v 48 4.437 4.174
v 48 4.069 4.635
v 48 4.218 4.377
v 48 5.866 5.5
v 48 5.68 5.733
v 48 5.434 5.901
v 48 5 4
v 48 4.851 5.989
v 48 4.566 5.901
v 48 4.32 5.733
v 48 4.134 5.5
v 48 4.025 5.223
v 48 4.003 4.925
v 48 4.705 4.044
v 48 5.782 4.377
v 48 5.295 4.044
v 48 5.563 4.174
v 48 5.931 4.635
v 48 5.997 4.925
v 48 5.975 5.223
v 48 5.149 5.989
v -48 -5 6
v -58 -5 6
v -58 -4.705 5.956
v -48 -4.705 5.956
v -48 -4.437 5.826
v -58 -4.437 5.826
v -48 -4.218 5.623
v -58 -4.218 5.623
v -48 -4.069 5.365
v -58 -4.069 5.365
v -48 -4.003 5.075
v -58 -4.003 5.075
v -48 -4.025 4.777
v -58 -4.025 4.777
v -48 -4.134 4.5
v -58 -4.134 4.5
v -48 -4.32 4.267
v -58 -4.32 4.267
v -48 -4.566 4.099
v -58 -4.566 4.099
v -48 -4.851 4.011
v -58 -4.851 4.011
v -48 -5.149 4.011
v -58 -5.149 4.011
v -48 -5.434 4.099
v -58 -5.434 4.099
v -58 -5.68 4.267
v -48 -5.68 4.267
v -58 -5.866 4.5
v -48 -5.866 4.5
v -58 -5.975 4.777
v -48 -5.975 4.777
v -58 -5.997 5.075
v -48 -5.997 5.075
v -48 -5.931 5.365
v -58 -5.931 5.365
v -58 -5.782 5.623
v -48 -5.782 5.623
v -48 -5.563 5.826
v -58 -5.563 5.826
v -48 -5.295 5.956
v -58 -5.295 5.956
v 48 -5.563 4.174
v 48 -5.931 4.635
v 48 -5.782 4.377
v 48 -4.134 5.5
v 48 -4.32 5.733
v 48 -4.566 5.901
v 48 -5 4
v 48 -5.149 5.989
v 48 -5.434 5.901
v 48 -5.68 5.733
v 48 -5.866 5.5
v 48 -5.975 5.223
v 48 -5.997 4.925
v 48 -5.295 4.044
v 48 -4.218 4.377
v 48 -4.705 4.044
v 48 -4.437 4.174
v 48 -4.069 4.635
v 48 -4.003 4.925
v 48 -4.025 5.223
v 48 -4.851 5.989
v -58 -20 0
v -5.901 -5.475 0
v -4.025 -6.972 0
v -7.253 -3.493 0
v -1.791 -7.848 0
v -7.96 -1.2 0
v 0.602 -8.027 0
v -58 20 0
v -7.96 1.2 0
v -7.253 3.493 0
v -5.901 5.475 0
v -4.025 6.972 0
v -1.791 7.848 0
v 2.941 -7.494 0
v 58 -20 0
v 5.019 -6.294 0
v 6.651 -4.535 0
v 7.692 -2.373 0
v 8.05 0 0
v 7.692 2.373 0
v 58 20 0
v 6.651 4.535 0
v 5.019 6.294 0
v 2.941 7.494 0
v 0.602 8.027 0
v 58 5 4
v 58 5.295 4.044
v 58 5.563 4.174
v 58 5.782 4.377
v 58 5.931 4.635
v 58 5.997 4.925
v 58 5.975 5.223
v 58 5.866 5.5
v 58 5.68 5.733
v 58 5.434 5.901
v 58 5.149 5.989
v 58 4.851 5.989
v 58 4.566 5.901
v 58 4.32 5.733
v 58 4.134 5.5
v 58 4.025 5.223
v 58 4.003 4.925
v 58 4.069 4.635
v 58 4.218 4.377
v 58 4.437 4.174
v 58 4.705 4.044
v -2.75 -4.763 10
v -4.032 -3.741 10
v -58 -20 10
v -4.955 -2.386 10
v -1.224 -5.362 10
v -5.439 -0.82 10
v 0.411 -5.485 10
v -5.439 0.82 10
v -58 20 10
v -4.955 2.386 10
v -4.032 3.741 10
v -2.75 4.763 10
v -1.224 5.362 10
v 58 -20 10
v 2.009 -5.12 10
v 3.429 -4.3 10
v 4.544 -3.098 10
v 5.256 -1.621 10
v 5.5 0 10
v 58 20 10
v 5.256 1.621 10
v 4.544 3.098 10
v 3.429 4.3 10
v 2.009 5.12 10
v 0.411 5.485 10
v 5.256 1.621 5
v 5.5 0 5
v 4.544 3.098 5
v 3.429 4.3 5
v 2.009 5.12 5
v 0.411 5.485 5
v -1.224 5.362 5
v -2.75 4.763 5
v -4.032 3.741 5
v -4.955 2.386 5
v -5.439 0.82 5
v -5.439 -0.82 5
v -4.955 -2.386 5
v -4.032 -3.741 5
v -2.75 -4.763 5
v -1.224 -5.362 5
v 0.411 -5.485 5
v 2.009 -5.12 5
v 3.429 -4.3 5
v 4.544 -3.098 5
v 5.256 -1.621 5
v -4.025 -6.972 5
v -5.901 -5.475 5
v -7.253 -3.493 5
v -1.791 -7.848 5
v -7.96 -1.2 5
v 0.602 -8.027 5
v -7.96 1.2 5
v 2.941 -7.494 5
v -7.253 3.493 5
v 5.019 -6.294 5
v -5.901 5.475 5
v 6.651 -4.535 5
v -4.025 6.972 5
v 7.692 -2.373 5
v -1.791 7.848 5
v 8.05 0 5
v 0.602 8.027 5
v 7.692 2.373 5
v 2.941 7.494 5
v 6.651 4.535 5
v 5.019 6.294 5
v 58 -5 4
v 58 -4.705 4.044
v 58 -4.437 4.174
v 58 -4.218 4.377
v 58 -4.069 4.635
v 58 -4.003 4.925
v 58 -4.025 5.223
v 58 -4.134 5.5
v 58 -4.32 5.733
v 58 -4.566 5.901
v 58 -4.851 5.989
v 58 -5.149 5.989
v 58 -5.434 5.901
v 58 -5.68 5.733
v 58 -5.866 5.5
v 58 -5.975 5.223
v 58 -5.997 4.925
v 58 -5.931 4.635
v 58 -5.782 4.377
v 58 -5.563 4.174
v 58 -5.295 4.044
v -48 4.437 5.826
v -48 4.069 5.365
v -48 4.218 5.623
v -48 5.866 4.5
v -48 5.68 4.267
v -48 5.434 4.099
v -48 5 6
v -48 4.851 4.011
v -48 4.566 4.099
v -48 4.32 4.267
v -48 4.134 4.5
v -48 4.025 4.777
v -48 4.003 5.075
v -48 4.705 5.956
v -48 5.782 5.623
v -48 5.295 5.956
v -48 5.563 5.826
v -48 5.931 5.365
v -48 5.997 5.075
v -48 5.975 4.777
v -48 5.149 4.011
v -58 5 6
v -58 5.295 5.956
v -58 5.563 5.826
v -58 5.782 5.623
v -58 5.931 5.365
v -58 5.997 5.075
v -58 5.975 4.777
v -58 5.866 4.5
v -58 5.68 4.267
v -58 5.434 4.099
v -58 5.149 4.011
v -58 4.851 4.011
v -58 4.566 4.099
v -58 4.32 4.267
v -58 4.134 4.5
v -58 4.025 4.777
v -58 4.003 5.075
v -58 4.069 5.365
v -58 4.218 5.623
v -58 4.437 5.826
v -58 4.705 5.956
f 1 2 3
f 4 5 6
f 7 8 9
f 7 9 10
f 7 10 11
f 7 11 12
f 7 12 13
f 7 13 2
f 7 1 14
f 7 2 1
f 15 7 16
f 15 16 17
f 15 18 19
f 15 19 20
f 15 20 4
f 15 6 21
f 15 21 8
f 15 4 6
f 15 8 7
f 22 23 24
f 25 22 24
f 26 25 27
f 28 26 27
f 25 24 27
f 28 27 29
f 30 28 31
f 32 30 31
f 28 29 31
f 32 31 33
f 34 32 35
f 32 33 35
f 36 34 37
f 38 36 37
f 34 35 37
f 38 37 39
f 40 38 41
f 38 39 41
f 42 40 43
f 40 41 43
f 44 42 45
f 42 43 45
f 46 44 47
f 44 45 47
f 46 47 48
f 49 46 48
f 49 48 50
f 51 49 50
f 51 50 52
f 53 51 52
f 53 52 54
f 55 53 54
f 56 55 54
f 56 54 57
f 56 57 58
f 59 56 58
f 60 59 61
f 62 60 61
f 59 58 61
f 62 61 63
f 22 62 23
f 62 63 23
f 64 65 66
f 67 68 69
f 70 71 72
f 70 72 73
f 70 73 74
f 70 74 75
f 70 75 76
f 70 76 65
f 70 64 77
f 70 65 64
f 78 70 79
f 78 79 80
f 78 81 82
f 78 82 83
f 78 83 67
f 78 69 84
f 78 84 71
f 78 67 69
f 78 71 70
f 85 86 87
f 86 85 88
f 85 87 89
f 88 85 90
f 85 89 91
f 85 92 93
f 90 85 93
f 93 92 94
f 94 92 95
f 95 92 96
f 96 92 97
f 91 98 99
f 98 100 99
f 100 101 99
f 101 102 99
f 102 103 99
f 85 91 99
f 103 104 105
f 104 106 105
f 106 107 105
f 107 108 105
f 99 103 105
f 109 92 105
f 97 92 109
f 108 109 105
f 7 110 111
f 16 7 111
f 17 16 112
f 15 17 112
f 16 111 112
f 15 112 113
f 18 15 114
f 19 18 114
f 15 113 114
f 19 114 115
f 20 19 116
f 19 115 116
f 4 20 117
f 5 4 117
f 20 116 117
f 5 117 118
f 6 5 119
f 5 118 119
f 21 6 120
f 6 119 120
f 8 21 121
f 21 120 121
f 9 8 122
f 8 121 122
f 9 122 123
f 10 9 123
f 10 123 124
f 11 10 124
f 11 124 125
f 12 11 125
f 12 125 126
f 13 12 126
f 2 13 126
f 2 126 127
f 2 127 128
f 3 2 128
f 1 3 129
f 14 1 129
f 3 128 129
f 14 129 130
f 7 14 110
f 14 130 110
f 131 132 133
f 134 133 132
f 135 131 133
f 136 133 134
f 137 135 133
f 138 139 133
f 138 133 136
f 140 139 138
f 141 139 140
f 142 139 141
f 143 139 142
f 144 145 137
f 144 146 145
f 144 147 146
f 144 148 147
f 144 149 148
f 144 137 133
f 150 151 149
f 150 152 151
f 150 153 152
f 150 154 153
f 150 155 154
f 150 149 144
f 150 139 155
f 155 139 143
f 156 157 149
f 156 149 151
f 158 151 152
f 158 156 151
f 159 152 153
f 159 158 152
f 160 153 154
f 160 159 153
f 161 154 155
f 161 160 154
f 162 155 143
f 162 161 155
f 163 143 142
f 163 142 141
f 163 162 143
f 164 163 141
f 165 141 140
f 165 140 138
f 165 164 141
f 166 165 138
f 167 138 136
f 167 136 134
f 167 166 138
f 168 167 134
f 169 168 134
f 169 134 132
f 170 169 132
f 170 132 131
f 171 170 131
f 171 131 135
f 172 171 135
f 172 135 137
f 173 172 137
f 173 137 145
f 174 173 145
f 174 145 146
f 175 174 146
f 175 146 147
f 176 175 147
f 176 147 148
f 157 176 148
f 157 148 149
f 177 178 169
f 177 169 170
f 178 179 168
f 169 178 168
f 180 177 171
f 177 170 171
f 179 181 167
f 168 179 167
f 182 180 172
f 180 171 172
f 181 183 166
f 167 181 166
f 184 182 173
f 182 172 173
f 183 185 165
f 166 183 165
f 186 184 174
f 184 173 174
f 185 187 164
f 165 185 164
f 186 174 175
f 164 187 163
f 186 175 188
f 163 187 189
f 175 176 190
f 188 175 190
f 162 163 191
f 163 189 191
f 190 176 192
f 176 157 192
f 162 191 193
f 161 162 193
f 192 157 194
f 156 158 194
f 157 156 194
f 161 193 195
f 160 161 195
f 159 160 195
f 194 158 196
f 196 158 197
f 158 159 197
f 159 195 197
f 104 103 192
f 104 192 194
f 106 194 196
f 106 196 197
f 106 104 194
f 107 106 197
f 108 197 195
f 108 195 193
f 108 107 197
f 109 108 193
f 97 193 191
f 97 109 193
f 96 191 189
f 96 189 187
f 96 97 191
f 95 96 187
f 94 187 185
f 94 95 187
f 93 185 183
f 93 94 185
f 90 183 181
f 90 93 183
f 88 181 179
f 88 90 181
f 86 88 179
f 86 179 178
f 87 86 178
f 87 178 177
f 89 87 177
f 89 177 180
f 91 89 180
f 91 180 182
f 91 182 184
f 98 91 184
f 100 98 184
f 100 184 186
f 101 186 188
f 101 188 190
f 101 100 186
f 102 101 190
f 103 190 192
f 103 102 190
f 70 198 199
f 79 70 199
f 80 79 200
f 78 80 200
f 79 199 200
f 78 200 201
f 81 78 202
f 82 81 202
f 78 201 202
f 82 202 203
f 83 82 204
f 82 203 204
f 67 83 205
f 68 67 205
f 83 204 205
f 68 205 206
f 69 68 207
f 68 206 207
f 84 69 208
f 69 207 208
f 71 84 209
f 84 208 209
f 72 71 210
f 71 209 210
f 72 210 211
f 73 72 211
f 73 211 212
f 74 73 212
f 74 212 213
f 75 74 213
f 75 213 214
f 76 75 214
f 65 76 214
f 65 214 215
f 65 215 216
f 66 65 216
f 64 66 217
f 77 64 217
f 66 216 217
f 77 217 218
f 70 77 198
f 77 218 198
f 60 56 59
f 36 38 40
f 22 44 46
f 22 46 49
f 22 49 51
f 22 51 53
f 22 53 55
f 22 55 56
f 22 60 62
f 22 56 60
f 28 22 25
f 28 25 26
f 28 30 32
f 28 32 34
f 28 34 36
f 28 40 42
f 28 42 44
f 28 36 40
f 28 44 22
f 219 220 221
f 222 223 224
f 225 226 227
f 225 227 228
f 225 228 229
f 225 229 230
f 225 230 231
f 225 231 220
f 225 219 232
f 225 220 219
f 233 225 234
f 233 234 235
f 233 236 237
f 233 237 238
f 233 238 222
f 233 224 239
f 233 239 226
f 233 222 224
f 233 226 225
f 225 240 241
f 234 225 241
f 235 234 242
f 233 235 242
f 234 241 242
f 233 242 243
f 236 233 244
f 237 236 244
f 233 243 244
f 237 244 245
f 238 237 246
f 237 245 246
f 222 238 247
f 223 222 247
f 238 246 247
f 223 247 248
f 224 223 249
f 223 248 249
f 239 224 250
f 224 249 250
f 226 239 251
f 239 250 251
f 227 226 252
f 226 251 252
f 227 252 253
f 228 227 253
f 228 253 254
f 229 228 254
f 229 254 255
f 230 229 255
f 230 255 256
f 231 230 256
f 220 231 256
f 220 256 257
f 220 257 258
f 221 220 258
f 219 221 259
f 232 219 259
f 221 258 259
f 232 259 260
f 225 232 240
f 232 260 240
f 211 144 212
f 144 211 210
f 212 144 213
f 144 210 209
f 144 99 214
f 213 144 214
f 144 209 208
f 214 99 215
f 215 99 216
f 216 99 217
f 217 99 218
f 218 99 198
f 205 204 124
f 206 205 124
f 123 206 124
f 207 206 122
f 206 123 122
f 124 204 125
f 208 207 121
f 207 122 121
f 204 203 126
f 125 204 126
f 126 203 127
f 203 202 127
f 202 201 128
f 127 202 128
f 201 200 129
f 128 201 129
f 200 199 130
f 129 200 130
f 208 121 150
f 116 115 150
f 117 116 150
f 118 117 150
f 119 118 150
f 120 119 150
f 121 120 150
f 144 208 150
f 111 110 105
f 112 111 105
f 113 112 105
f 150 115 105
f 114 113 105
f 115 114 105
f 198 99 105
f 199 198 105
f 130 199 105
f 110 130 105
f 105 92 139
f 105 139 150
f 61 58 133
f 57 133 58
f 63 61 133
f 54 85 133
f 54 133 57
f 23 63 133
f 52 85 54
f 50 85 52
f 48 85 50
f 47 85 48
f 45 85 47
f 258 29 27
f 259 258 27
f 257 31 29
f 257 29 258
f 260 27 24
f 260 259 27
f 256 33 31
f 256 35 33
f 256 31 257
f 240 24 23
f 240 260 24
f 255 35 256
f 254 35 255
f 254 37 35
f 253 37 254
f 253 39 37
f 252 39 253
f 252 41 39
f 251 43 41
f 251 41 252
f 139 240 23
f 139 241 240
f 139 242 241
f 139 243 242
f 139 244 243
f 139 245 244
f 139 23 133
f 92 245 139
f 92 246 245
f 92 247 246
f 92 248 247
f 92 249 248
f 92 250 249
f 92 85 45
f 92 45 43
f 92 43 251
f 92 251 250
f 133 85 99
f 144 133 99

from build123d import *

# Parameters (mm, degrees)
SKETCH1_W           = 116
SKETCH1_H           = 40
SKETCH1_R           = 5.5
BOSS_EXTRUDE2_DEPTH = 10
SKETCH4_R           = 1
CUT_EXTRUDE1_DEPTH  = 10
SKETCH6_R           = 1
CUT_EXTRUDE3_DEPTH  = 10
SKETCH8_R           = 8.05
CUT_EXTRUDE8_DEPTH  = 5


with BuildPart() as part:
    # Sketch1 → Boss-Extrude2 (new body)
    with BuildSketch(Plane.XY):
        Rectangle(SKETCH1_W, SKETCH1_H)
        Circle(SKETCH1_R, mode=Mode.SUBTRACT)
    extrude(amount=BOSS_EXTRUDE2_DEPTH)

    # Sketch4 → Cut-Extrude1 (cut)
    with BuildSketch(Plane(origin=(58, 0, 0), x_dir=(0, 0, -1), z_dir=(1, 0, 0))):
        with Locations((-5, -5)):
            Circle(SKETCH4_R)
        with Locations((-5, 5)):
            Circle(SKETCH4_R)
    extrude(amount=-CUT_EXTRUDE1_DEPTH, mode=Mode.SUBTRACT)

    # Sketch6 → Cut-Extrude3 (cut)
    with BuildSketch(Plane.ZY.offset(58)):
        with Locations((5, 5)):
            Circle(SKETCH6_R)
        with Locations((5, -5)):
            Circle(SKETCH6_R)
    extrude(amount=-CUT_EXTRUDE3_DEPTH, mode=Mode.SUBTRACT)

    # Sketch8 → Cut-Extrude8 (cut)
    with BuildSketch(Plane.XY):
        Circle(SKETCH8_R)
    extrude(amount=CUT_EXTRUDE8_DEPTH, mode=Mode.SUBTRACT)


solid = part.part
